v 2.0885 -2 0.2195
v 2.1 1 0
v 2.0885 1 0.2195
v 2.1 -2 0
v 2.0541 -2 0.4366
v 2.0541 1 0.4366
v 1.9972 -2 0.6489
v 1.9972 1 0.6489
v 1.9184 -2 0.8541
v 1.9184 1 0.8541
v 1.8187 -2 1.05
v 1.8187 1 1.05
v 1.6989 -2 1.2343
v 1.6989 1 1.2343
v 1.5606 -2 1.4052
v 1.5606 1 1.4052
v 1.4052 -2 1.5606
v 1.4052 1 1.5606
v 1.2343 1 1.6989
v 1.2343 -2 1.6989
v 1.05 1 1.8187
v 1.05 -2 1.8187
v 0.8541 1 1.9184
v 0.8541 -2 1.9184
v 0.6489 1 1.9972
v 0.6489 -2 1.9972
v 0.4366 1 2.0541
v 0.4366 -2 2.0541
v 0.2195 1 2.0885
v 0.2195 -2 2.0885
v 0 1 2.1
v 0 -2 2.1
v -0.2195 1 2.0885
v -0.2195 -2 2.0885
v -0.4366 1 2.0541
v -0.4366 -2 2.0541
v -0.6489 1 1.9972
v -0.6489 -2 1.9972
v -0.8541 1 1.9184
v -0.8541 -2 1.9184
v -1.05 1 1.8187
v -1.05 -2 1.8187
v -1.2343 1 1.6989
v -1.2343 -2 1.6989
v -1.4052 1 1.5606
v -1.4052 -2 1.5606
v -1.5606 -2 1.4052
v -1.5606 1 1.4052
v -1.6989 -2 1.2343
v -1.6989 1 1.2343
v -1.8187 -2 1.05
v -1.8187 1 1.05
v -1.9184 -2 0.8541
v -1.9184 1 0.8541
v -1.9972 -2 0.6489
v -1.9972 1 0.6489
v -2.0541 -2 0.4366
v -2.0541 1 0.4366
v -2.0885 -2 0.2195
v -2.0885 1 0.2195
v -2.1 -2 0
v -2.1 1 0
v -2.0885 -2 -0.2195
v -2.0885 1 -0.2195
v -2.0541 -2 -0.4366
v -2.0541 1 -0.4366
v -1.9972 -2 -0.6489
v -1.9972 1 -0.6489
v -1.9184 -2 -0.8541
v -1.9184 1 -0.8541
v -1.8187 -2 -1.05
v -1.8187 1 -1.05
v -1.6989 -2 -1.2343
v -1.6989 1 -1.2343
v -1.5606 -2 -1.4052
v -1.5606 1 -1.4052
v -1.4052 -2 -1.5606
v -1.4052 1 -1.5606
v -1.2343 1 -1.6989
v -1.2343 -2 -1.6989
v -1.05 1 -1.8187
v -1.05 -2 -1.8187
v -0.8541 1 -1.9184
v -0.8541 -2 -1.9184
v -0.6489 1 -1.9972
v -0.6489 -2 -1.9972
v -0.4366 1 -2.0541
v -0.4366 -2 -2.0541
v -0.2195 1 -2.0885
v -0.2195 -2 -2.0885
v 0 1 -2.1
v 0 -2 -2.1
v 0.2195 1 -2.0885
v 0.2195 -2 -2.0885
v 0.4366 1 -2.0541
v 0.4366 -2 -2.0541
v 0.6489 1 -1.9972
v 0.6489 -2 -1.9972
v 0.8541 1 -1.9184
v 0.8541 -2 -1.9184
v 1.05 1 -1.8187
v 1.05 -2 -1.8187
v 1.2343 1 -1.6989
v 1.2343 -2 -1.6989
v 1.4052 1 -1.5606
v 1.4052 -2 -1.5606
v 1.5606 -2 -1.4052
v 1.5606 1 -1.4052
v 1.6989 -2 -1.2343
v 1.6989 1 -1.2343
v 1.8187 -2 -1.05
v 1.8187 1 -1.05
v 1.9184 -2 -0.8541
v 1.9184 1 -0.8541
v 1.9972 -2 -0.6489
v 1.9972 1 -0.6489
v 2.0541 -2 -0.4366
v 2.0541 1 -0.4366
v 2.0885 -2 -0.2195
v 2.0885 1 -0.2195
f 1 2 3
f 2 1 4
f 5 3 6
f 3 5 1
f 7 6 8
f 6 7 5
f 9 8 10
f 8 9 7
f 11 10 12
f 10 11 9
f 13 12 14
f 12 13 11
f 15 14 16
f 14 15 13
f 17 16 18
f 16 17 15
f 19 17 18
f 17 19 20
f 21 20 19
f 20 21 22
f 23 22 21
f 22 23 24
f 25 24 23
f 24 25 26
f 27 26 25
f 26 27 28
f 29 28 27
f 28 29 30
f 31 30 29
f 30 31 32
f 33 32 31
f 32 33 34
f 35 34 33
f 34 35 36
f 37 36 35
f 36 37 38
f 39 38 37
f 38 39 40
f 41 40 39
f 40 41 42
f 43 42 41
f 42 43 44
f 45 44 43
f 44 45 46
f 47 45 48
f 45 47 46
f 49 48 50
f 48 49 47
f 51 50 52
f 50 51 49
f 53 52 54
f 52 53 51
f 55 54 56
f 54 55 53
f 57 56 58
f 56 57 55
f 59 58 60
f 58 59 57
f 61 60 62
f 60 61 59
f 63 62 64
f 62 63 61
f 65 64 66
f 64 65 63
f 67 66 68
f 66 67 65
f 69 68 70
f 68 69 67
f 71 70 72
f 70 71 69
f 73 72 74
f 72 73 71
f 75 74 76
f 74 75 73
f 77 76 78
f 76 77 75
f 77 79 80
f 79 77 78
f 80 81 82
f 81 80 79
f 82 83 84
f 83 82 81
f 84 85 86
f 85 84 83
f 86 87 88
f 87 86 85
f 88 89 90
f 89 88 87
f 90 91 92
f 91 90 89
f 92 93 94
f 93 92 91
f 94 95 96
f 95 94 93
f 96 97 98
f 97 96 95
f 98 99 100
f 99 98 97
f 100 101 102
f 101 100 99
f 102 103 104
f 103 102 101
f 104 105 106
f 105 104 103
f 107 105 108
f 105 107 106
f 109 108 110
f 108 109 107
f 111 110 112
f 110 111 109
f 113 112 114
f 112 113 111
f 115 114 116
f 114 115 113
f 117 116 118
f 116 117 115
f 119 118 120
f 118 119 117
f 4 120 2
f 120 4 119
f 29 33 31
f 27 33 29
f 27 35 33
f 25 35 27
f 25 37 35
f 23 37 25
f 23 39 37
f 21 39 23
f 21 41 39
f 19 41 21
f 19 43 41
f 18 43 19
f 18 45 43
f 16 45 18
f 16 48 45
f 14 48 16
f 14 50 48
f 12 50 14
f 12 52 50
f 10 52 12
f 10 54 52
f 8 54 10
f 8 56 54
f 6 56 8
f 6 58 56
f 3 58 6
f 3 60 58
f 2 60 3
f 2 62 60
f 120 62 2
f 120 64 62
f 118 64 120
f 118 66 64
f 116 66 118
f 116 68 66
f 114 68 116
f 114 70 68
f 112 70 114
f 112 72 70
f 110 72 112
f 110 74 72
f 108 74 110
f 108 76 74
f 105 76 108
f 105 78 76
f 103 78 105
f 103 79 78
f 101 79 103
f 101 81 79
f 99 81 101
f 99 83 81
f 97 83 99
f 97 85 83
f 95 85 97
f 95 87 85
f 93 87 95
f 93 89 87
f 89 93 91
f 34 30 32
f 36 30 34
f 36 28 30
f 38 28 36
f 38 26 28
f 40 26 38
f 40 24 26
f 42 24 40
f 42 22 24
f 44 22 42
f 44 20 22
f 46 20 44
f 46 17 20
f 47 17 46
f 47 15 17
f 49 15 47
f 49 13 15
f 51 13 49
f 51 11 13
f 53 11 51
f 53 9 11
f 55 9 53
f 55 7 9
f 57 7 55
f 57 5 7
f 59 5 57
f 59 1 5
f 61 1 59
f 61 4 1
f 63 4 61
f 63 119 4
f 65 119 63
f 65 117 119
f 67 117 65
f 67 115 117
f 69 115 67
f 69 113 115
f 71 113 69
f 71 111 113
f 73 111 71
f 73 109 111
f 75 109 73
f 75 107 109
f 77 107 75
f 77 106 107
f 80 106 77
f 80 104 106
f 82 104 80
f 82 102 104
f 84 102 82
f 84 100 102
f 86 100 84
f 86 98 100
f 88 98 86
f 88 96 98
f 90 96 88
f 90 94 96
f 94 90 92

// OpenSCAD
// file: screwprop.scad
module screwprop(radius, inside_radius, pitch, chord)
{
rad_res = 15;
chord_res = 15;
chord_cmass = 40;  // As a percent of cord, specifies the center of mass of the section.
thick_cmass = 5;   // As a percent of chord, specifies the center of mass of the section.

// Describes the upper surface as a percent of chord
function top_foil(p) = lookup(p, [
		[0, 0 ],
		[1.25, .04 ],
		[2.5, .0579],
		[5, .082],
		[7.5, .1 ],
            [10, .1138],
            [15, .13],
            [20, .1385],
            [25, .1429],
            [30, .1418],
            [35, .1384],
            [40, .1321],
            [50, .1129],
            [60, .0894],
            [70, .0622],
            [80, .0378],
            [90, .0157],
            [100, 0] 
	]);

// Describes the lower surface as a percent of chort
function bottom_foil(p) = lookup(p, [
		[0,0 ],
		[5, -.03 ],
		[10, -.04 ],
		[ 50, -.03 ],
		[ 100, 0 ]
	]);

// Modifies chord as a function of radius
function chord_modifier(p) = lookup(p, [
		[0, 1 ],
    [50, 1],
		[100, .6]
	]);  
	
// Modifies thickness as a function of radius
function thick_modifier(p) = lookup(p, [
		[0, 2 ],
            [50, 1],
		[100, 1]
	]); 
	 
// Angle of attack as a function of radius
function attack_modifier(p) = lookup(p, [
		[0, 0 ],
            [50, 0],
		[100, 0]
	]); 

// Internal variables
// First inside vars, scaled
x1=0; x2=0; // x must be slow axis
y11=0; y12=0;  y21=0; y22=0;
z11t=0; z12t=0;  z21t=0; z22t=0;
z11b=0; z12b=0;  z21b=0; z22b=0;
xtable1 = 0; xtable2 = 0;  // for table look up
ytable1 = 0; ytable2 = 0;  // for table look up
zoffset1 = 0; zoffset2 = 0;   // For center of mass adjustment

// First inside vars, scaled
ang1 = 0; ang2 = 0;

// Third inside vars
cos1 = 0; cos2 = 0; sin1 = 0; sin2 = 0;

// Forth inside vars
p0  = [0,0,0]; p1 = [0,0,0];p2  = [0,0,0]; p3 = [0,0,0];
p4  = [0,0,0]; p5 = [0,0,0];p6  = [0,0,0]; p7 = [0,0,0];

for ( x = [0:rad_res-1], y = [0:chord_res-1]) {
assign(    x1 = inside_radius+(radius - inside_radius)*(x/(rad_res)), 
           x2 =  inside_radius+(radius - inside_radius)*((x+1)/(rad_res))){

assign(    xtable1 = x1 *100  / radius,
           xtable2 = x2 *100  /radius,
           ytable1 = y*100/chord_res,
           ytable2 = (y+1)*100/chord_res){

assign(    ang1 = atan(x1*3.14159*2/pitch) - attack_modifier(xtable1), 
           ang2 = atan(x2*3.14159*2/pitch) - attack_modifier(xtable2),
           zoffset1 = -chord*thick_cmass*chord_modifier(xtable1)* thick_modifier(xtable1)/100,
           zoffset2 =- chord*thick_cmass*chord_modifier(xtable2)* thick_modifier(xtable2)/100){
           
assign(    cos1 = cos(ang1), cos2 = cos(ang2), 
           sin1 = sin(ang1), sin2 = sin(ang2),
           y11=chord_cmass*chord*chord_modifier(xtable1)/100 -  y*chord*chord_modifier(xtable1)/chord_res,
           y12=chord_cmass*chord*chord_modifier(xtable1)/100 - (y+1)*chord*chord_modifier(xtable1)/chord_res,
           y21=chord_cmass*chord*chord_modifier(xtable2)/100 -  y*chord*chord_modifier(xtable2)/chord_res, 
           y22=chord_cmass*chord*chord_modifier(xtable2)/100  - (y+1)*chord*chord_modifier(xtable2)/chord_res,
           z11t = zoffset1 + chord*chord_modifier(xtable1)*top_foil(ytable1)* thick_modifier(xtable1),
           z12t = zoffset1 + chord*chord_modifier(xtable1)*top_foil(ytable2)* thick_modifier(xtable1),
           z21t = zoffset2 + chord*chord_modifier(xtable2)*top_foil(ytable1)* thick_modifier(xtable2),
           z22t = zoffset2 + chord*chord_modifier(xtable2)*top_foil(ytable2)* thick_modifier(xtable2),          
           z11b = zoffset1 + chord*chord_modifier(xtable1)*bottom_foil(ytable1)* thick_modifier(xtable1),
           z12b = zoffset1 + chord*chord_modifier(xtable1)*bottom_foil(ytable2)* thick_modifier(xtable1),
           z21b = zoffset2 + chord*chord_modifier(xtable2)*bottom_foil(ytable1)* thick_modifier(xtable2),
           z22b = zoffset2 + chord*chord_modifier(xtable2)*bottom_foil(ytable2)* thick_modifier(xtable2)){

assign(   // rotational transform
           p0 = [x1, y11*cos1 + z11t*sin1, z11t*cos1 - y11*sin1],
           p1 = [x1, y12*cos1 + z12t*sin1, z12t*cos1 - y12*sin1],
           p2 = [x1, y11*cos1 + z11b*sin1, z11b*cos1 - y11*sin1],
           p3 = [x1, y12*cos1 + z12b*sin1, z12b*cos1 - y12*sin1],
           p4 = [x2, y21*cos2 + z21t*sin2, z21t*cos2 - y21*sin2],
           p5 = [x2, y22*cos2 + z22t*sin2, z22t*cos2 - y22*sin2],
           p6 = [x2, y21*cos2 + z21b*sin2, z21b*cos2 - y21*sin2],
           p7 = [x2, y22*cos2 + z22b*sin2, z22b*cos2 - y22*sin2]
){  
if(x == 0) {

    polyhedron
    (points = [p0, p1, p2, p3, p4, p5, p6, p7],
     triangles =  [
                 [0,1,2],  [2,1,3],  // inside endcap
            //    [4,6,5], [5,6,7],  // outside endcap
            //      [0,2,4],[2,4,6],[1,5,3],[7,5,3],    // interiors, not used ever
                    [0,4,5],[1,0,5],[2,3,6],[6,3,7]   // main surfaces
                  ]
     );  // end poly

} else{

  if(x==rad_res-1) {

    polyhedron
    (points = [p0, p1, p2, p3, p4, p5, p6, p7],
     triangles =  [
             //    [0,1,2],  [2,1,3],  // inside endcap
                [4,6,5], [5,6,7],  // outside endcap
            //      [0,2,4],[2,4,6],[1,5,3],[7,5,3],    // interiors, not used ever
                    [0,4,5],[1,0,5],[2,3,6],[6,3,7]   // main surfaces
                  ]
     );  // end poly

} else {

    polyhedron
    (points = [p0, p1, p2, p3, p4, p5, p6, p7],
     triangles =  [
             //    [0,1,2],  [2,1,3],  // inside endcap
            //    [4,6,5], [5,6,7],  // outside endcap
            //      [0,2,4],[2,4,6],[1,5,3],[7,5,3],    // interiors, not used ever
                    [0,4,5],[1,0,5],[2,3,6],[6,3,7]   // main surfaces
                  ]
     );  // end poly

  }
}

  }  // end assign
  }  // end assign
  }  // end assign
  }  // end assign
  }  // end assign  
};  // end for


};   // end module


////////////////////////////////
////////////////////////////////

   //   screwprop(12, 3, 20, 2.5);
// main file
include <screwprop.scad>;
screwprop(12, 2, 20, 3);
rotate(a=[0,90,0])  {screwprop(12, 2, 20, 3);};
rotate(a=[0,180,0]) {screwprop(12, 2,  20, 3);};
rotate(a=[0,270,0]) {screwprop(12, 2, 20, 3);};
translate([0,1,0])rotate(a=[90,0,0]) cylinder(h = 3, r=2.1, $fn=60);
